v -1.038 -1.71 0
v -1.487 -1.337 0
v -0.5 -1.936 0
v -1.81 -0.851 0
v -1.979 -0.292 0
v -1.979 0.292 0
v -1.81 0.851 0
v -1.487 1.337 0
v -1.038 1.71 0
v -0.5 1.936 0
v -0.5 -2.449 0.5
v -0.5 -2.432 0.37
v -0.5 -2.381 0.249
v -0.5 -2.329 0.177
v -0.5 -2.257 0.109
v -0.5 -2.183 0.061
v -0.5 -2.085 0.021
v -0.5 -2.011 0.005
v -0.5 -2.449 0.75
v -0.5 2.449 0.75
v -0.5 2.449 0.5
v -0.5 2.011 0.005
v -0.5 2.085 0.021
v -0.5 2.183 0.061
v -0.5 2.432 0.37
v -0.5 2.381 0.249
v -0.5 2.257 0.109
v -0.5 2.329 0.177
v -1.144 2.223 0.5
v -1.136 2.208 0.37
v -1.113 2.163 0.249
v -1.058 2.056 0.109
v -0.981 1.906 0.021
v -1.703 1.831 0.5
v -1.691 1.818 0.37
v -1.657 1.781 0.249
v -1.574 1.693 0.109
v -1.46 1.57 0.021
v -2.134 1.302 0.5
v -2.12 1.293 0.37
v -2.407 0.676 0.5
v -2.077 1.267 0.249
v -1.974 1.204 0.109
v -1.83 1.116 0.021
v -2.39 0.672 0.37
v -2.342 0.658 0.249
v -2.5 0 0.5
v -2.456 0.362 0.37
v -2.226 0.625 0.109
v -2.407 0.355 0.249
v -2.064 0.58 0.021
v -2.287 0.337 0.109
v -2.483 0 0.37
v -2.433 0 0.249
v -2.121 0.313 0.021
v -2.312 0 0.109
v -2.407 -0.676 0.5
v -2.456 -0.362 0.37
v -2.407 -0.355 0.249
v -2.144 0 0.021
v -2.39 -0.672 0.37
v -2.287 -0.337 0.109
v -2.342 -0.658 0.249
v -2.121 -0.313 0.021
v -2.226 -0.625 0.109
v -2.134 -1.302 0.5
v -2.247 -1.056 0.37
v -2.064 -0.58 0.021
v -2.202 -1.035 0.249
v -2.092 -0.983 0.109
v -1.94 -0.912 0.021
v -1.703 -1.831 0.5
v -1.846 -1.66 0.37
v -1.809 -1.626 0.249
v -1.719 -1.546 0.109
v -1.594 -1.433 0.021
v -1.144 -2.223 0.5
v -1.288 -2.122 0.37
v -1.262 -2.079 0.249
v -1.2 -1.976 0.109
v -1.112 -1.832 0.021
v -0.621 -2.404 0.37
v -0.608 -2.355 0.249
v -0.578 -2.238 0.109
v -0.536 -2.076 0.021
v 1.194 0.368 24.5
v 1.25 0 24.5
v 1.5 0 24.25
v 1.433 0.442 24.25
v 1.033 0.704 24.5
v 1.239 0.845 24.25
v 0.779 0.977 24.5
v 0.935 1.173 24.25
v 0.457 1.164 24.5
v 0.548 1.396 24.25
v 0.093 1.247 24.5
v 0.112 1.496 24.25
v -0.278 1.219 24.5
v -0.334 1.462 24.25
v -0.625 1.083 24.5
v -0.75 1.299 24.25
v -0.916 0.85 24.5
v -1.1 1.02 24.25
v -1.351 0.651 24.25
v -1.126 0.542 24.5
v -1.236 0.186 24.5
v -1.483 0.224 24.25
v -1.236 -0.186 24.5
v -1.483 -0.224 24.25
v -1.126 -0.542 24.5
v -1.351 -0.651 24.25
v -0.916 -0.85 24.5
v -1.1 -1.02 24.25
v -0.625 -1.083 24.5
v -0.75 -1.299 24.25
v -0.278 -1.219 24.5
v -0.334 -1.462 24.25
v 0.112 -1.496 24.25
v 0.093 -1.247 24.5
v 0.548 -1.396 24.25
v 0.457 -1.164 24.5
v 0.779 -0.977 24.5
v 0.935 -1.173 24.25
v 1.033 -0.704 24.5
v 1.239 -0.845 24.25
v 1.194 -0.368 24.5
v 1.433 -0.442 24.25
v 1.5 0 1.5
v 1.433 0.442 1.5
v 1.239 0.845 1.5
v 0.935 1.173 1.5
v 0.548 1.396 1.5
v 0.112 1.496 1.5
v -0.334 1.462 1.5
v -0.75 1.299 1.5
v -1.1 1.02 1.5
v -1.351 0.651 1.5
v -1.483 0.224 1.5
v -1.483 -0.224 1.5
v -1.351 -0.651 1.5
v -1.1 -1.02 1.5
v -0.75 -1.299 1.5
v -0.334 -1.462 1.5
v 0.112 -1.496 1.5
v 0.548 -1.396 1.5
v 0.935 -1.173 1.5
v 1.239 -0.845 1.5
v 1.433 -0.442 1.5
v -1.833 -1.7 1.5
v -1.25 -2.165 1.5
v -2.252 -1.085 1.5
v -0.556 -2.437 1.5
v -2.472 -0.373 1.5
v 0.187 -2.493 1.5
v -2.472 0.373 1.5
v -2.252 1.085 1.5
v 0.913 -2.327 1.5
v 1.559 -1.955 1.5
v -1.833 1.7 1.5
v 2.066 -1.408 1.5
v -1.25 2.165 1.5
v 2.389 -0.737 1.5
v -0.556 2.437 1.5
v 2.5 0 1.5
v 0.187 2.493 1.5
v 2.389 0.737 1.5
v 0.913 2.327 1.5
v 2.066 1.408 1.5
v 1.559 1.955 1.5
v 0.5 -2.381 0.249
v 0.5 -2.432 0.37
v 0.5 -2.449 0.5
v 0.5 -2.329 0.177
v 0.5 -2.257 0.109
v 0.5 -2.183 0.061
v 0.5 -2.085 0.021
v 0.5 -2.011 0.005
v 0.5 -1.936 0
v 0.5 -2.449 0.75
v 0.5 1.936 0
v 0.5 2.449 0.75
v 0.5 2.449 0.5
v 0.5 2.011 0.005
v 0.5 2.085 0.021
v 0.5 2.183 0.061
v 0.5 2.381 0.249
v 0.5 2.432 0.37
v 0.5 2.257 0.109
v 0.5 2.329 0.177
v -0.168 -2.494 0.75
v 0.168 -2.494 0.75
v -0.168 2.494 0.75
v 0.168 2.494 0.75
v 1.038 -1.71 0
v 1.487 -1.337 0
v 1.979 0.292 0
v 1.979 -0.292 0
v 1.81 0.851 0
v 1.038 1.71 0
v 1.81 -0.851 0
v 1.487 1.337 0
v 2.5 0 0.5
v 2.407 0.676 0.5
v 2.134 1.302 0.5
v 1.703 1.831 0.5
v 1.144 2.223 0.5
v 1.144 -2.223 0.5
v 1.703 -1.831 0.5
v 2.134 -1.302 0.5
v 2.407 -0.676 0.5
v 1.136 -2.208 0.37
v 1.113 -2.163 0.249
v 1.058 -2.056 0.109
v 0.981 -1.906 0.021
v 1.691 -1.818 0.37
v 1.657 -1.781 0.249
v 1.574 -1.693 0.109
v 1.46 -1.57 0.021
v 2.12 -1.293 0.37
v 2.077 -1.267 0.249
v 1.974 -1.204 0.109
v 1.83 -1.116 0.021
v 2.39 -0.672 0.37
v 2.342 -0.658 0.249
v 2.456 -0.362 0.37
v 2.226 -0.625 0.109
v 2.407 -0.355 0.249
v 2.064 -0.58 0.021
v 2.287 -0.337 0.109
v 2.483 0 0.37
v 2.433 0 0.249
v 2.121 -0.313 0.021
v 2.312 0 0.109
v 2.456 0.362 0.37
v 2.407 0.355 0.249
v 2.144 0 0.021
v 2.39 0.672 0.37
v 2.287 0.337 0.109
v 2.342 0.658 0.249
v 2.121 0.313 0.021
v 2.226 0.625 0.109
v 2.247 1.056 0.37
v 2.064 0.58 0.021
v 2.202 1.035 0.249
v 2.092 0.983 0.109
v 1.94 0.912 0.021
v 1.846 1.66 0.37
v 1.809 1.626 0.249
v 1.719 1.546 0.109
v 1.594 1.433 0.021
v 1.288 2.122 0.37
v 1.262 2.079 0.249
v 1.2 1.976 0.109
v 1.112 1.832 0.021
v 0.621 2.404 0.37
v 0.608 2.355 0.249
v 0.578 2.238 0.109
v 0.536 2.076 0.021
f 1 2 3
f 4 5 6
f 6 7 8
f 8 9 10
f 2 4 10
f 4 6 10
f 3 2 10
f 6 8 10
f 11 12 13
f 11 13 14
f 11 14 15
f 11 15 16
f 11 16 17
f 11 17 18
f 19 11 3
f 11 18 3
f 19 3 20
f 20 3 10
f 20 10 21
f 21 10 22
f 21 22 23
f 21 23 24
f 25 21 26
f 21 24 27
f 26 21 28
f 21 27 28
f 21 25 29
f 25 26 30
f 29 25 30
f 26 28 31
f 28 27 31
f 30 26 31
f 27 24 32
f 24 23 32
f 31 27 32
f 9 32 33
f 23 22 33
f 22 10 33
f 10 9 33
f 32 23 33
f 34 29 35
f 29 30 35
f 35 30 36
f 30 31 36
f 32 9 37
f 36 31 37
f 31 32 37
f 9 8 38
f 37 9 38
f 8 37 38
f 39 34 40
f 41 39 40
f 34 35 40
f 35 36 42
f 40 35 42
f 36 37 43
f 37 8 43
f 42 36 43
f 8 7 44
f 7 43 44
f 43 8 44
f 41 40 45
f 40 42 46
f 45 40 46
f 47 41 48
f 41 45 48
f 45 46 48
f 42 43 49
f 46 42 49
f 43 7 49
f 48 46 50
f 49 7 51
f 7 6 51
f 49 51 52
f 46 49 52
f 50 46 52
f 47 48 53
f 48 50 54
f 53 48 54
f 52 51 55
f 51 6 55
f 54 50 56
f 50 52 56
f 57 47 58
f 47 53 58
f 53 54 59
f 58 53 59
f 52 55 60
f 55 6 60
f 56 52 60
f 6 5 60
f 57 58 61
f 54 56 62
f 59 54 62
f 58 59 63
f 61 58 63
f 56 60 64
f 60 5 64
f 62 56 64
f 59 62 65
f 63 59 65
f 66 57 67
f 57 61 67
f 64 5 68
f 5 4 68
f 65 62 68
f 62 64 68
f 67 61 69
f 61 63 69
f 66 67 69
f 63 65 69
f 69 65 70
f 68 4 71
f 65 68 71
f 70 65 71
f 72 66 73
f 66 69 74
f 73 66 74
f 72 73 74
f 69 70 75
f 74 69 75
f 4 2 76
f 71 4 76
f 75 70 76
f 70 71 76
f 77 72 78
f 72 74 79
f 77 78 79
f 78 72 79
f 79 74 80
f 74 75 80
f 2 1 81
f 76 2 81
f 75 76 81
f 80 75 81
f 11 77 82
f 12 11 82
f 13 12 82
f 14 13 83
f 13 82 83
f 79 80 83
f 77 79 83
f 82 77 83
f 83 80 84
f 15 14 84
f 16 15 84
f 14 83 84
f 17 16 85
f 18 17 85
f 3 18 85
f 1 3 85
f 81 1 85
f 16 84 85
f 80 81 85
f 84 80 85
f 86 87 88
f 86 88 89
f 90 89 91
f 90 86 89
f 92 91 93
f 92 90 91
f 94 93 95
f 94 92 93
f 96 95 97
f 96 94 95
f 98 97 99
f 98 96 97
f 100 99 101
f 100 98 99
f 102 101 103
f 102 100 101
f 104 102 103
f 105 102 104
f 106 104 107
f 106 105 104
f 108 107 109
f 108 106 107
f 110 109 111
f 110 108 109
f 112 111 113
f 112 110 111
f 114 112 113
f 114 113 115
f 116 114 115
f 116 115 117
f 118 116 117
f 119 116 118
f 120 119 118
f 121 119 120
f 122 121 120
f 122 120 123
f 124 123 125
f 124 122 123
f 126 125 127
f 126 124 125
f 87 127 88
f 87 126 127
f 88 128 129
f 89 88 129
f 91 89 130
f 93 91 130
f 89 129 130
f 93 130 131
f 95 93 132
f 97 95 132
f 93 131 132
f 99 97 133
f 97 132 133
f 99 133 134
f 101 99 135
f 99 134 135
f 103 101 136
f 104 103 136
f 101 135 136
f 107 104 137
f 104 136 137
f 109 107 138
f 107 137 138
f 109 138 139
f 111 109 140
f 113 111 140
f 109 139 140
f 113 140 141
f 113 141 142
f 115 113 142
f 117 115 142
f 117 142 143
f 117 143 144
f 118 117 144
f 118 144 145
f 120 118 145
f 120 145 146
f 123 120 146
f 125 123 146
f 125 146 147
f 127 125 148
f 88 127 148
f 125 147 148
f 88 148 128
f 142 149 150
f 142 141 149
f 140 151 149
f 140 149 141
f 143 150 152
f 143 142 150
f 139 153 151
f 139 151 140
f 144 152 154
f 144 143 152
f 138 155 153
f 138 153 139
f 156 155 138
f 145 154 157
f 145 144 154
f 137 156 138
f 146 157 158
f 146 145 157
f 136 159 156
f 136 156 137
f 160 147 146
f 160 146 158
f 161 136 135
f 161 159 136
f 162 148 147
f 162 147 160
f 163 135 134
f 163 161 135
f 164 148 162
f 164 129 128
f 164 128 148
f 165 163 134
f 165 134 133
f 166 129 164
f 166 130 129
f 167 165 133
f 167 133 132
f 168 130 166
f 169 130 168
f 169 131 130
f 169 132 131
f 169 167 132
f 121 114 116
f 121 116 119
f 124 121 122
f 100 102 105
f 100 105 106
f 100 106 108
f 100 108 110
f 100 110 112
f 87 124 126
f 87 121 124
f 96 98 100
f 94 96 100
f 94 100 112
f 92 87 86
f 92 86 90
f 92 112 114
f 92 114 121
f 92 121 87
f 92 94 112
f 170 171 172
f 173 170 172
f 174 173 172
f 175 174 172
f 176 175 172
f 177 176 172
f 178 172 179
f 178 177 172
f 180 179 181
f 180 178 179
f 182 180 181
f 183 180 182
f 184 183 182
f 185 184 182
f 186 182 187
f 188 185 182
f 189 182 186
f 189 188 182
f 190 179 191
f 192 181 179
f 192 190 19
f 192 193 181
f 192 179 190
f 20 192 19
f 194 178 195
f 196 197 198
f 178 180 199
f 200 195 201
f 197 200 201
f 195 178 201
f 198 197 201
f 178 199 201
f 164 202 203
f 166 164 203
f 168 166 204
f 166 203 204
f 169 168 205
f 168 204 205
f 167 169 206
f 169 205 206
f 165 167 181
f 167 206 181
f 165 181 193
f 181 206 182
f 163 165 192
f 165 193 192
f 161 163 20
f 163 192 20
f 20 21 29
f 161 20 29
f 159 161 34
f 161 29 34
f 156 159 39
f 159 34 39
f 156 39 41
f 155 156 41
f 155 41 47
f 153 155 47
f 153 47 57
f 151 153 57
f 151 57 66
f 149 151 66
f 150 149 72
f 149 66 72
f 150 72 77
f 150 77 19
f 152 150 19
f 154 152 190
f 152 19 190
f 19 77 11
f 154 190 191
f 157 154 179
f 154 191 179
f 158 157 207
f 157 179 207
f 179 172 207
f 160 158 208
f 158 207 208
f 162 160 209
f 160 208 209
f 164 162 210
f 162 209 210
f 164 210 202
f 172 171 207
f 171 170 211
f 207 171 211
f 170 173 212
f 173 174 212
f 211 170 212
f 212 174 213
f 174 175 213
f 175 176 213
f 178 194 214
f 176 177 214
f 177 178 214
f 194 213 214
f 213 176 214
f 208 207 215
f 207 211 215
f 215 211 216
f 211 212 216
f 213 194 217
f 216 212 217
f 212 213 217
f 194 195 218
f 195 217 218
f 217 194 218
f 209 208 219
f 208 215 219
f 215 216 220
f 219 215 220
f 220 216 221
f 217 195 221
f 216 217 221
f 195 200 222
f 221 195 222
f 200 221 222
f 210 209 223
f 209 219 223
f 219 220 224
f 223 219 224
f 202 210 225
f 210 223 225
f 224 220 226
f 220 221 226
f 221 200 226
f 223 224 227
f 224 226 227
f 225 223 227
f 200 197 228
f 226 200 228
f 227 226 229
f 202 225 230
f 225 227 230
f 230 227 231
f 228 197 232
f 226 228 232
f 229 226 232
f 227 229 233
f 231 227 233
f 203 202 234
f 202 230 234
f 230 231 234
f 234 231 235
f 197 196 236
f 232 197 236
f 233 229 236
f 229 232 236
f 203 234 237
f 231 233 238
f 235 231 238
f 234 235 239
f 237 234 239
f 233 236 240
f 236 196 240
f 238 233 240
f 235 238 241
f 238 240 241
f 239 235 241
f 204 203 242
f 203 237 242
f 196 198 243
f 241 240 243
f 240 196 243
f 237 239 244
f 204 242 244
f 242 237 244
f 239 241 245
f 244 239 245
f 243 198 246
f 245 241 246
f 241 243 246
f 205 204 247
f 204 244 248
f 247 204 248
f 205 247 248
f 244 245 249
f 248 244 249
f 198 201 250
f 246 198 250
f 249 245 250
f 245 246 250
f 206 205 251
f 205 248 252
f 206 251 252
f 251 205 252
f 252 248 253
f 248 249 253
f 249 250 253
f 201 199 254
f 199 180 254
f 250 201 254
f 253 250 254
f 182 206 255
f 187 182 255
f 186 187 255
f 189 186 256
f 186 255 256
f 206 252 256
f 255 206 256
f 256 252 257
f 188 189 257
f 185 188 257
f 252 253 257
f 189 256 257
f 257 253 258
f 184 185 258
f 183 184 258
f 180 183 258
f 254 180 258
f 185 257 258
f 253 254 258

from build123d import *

# Parameters (mm, degrees)
ESQUISSE1_R             = 2.5
BASE_EXTRUSION_DEPTH    = 1.5
ESQUISSE2_R             = 1.5
BOSS_EXTRU_1_DEPTH      = 23
CHANFREIN1_SIZE         = 0.25
ESQUISSE3_W             = 1
ESQUISSE3_H             = 8
ENL_V_MAT_EXTRU_1_DEPTH = 0.75
CONG_1_R                = 0.5


with BuildPart() as part:
    # Esquisse1 → Base-Extrusion (new body)
    with BuildSketch(Plane.XY):
        Circle(ESQUISSE1_R)
    extrude(amount=BASE_EXTRUSION_DEPTH)

    # Esquisse2 → Boss.-Extru.1 (add)
    with BuildSketch(Plane.XY.offset(1.5)):
        Circle(ESQUISSE2_R)
    extrude(amount=BOSS_EXTRU_1_DEPTH)

    # Chanfrein1
    chanfrein1_edges = [part.edges().sort_by_distance(p)[0] for p in [
        (-1.5, 0, 24.5),
    ]]
    chamfer(chanfrein1_edges, length=CHANFREIN1_SIZE)

    # Esquisse3 → Enlèv. mat.-Extru.1 (cut)
    with BuildSketch(Plane(origin=(0, 0, 0), x_dir=(-1, 0, 0), z_dir=(0, 0, -1))):
        with Locations((0, -1)):
            Rectangle(ESQUISSE3_W, ESQUISSE3_H)
    extrude(amount=-ENL_V_MAT_EXTRU_1_DEPTH, mode=Mode.SUBTRACT)

    # Congé1
    cong_1_edges = [part.edges().sort_by_distance(p)[0] for p in [
        (1.936491673, 1.58113883, 0),
        (-2.5, 0, 0),
        (1.936491673, -1.58113883, 0),
    ]]
    fillet(cong_1_edges, radius=CONG_1_R)


solid = part.part
